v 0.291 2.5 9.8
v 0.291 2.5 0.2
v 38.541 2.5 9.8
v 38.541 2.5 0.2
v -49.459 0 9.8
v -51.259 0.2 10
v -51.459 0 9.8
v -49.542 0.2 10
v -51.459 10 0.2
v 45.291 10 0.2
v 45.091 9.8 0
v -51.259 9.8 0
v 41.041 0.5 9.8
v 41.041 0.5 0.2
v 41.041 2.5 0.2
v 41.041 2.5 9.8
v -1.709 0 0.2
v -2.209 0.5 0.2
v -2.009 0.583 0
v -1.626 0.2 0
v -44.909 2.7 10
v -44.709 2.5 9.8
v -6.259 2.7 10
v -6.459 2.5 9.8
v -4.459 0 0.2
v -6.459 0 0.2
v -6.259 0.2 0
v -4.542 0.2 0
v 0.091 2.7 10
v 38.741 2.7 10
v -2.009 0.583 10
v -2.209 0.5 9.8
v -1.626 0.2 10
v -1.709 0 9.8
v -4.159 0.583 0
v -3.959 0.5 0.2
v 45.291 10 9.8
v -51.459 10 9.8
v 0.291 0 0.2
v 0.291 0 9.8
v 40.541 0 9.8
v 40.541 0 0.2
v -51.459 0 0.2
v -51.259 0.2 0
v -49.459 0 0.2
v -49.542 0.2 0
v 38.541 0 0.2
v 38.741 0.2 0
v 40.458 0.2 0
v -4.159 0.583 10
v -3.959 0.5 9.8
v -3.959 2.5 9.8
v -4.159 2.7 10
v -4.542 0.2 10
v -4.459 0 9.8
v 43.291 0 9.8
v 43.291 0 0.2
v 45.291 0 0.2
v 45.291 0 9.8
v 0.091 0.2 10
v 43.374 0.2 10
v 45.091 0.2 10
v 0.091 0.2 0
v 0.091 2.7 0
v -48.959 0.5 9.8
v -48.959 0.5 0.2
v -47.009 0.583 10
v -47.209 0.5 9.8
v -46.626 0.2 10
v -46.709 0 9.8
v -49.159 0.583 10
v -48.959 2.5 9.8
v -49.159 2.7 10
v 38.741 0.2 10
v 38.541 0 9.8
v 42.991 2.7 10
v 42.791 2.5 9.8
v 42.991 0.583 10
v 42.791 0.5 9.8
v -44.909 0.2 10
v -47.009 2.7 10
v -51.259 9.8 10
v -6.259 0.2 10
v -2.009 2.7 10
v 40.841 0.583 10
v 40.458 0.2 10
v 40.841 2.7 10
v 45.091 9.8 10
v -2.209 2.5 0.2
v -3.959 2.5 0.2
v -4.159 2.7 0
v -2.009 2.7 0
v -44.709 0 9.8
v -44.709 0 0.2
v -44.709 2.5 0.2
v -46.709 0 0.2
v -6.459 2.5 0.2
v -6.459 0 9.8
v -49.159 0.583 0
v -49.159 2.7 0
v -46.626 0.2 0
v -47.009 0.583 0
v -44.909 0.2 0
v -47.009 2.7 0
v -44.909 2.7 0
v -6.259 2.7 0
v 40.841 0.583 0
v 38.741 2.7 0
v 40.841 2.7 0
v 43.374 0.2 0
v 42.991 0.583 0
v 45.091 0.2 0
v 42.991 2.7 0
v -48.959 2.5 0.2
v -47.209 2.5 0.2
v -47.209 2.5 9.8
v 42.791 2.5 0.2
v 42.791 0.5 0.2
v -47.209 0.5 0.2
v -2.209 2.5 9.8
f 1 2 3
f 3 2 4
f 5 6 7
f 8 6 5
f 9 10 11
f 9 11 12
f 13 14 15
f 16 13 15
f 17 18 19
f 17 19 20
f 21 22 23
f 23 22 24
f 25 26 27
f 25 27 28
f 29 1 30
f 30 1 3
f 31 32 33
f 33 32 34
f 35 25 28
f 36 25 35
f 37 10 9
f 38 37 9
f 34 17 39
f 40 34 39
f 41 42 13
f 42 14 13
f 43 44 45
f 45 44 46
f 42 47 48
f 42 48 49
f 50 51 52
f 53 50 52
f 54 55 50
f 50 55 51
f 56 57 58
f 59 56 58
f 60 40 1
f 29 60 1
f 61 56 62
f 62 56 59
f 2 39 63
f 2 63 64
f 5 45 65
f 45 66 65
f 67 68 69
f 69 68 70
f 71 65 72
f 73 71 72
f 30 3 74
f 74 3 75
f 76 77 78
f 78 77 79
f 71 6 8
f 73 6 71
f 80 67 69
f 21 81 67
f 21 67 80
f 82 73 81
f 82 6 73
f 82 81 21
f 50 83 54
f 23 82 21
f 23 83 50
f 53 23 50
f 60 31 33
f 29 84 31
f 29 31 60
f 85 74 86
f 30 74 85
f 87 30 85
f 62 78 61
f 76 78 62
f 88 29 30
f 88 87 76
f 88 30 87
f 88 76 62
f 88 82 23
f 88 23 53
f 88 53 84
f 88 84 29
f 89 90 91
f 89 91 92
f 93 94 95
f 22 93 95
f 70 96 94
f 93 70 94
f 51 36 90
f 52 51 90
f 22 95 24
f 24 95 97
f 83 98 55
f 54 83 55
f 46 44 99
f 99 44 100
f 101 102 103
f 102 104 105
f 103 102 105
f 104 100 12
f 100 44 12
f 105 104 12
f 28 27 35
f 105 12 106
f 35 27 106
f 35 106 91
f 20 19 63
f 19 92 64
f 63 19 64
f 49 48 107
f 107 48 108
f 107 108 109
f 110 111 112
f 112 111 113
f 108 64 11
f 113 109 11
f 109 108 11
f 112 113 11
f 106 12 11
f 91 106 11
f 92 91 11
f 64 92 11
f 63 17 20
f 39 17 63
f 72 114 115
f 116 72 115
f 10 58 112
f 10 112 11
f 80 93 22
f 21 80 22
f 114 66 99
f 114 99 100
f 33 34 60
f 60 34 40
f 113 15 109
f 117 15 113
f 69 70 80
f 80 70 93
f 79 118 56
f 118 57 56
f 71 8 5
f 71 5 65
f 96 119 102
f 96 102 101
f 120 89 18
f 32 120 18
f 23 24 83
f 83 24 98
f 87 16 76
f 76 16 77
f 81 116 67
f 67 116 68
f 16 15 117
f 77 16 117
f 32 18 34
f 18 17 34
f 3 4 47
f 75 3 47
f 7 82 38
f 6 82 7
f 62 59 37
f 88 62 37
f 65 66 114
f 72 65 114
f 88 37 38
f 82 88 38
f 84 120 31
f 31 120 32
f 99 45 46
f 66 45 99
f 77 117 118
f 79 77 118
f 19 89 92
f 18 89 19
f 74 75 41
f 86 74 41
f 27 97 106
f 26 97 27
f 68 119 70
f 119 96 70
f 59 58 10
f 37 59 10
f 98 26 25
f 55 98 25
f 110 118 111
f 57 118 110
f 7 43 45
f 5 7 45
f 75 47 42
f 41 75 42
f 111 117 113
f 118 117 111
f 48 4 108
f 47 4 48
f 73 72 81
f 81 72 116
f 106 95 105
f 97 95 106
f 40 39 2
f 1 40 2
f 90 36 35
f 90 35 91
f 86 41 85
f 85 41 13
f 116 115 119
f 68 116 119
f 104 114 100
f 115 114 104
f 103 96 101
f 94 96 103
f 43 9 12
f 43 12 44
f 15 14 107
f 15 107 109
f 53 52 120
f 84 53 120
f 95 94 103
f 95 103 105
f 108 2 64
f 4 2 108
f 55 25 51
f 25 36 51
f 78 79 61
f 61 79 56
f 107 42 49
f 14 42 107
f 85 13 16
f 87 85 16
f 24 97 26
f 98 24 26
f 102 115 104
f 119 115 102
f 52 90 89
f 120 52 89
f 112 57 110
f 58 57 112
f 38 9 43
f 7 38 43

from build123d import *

# Parameters (mm, degrees)
F1_DEPTH = 10
F2_SIZE  = 0.5
F3_SIZE  = 0.2


with BuildPart() as f1:
    # F0 (on Top) → F1 (new body)
    with BuildSketch(Plane.XY):
        Polygon((-51.458716, 10), (-51.458716, 0), (-48.958716, 0), (-48.958716, 2.5), (-47.208716, 2.5), (-47.208716, 0), (-44.708716, 0), (-44.708716, 2.5), (-6.458716, 2.5), (-6.458716, 0), (-3.958716, 0), (-3.958716, 2.5), (-2.208716, 2.5), (-2.208716, 0), (0.291284, 0), (0.291284, 2.5), (38.541284, 2.5), (38.541284, 0), (41.041284, 0), (41.041284, 2.5), (42.791284, 2.5), (42.791284, 0), (45.291284, 0), (45.291284, 10), align=None)
    extrude(amount=F1_DEPTH)

    # F2
    f2_edges = [f1.edges().sort_by_distance(p)[0] for p in [
        (-48.958716, 0, 5),
        (-47.208716, 0, 5),
        (-2.208716, 0, 5),
        (-3.958716, 0, 5),
        (42.791284, 0, 5),
        (41.041284, 0, 5),
    ]]
    chamfer(f2_edges, length=F2_SIZE)

    # F3
    f3_edges = [f1.edges().sort_by_distance(p)[0] for p in [
        (-50.458716, 0, 10),
        (-49.208716, 0.25, 10),
        (-51.458716, 5, 10),
        (-48.958716, 1.5, 10),
        (-3.083716, 10, 10),
        (-48.083716, 2.5, 10),
        (45.291284, 5, 10),
        (-47.208716, 1.5, 10),
        (44.291284, 0, 10),
        (-46.958716, 0.25, 10),
        (43.041284, 0.25, 10),
        (-45.708716, 0, 10),
        (42.791284, 1.5, 10),
        (-44.708716, 1.25, 10),
        (41.916284, 2.5, 10),
        (-25.583716, 2.5, 10),
        (41.041284, 1.5, 10),
        (-6.458716, 1.25, 10),
        (40.791284, 0.25, 10),
        (-5.458716, 0, 10),
        (39.541284, 0, 10),
        (-4.208716, 0.25, 10),
        (38.541284, 1.25, 10),
        (-3.958716, 1.5, 10),
        (19.416284, 2.5, 10),
        (-3.083716, 2.5, 10),
        (0.291284, 1.25, 10),
        (-2.208716, 1.5, 10),
        (-0.708716, 0, 10),
        (-1.958716, 0.25, 10),
        (-50.458716, 0, 0),
        (-49.208716, 0.25, 0),
        (-51.458716, 5, 0),
        (-48.958716, 1.5, 0),
        (-3.083716, 10, 0),
        (-48.083716, 2.5, 0),
        (45.291284, 5, 0),
        (-47.208716, 1.5, 0),
        (44.291284, 0, 0),
        (-46.958716, 0.25, 0),
        (43.041284, 0.25, 0),
        (-45.708716, 0, 0),
        (42.791284, 1.5, 0),
        (-44.708716, 1.25, 0),
        (41.916284, 2.5, 0),
        (-25.583716, 2.5, 0),
        (41.041284, 1.5, 0),
        (-6.458716, 1.25, 0),
        (40.791284, 0.25, 0),
        (-5.458716, 0, 0),
        (39.541284, 0, 0),
        (-4.208716, 0.25, 0),
        (38.541284, 1.25, 0),
        (-3.958716, 1.5, 0),
        (19.416284, 2.5, 0),
        (-3.083716, 2.5, 0),
        (0.291284, 1.25, 0),
        (-2.208716, 1.5, 0),
        (-0.708716, 0, 0),
        (-1.958716, 0.25, 0),
    ]]
    chamfer(f3_edges, length=F3_SIZE)


solid = f1.part
